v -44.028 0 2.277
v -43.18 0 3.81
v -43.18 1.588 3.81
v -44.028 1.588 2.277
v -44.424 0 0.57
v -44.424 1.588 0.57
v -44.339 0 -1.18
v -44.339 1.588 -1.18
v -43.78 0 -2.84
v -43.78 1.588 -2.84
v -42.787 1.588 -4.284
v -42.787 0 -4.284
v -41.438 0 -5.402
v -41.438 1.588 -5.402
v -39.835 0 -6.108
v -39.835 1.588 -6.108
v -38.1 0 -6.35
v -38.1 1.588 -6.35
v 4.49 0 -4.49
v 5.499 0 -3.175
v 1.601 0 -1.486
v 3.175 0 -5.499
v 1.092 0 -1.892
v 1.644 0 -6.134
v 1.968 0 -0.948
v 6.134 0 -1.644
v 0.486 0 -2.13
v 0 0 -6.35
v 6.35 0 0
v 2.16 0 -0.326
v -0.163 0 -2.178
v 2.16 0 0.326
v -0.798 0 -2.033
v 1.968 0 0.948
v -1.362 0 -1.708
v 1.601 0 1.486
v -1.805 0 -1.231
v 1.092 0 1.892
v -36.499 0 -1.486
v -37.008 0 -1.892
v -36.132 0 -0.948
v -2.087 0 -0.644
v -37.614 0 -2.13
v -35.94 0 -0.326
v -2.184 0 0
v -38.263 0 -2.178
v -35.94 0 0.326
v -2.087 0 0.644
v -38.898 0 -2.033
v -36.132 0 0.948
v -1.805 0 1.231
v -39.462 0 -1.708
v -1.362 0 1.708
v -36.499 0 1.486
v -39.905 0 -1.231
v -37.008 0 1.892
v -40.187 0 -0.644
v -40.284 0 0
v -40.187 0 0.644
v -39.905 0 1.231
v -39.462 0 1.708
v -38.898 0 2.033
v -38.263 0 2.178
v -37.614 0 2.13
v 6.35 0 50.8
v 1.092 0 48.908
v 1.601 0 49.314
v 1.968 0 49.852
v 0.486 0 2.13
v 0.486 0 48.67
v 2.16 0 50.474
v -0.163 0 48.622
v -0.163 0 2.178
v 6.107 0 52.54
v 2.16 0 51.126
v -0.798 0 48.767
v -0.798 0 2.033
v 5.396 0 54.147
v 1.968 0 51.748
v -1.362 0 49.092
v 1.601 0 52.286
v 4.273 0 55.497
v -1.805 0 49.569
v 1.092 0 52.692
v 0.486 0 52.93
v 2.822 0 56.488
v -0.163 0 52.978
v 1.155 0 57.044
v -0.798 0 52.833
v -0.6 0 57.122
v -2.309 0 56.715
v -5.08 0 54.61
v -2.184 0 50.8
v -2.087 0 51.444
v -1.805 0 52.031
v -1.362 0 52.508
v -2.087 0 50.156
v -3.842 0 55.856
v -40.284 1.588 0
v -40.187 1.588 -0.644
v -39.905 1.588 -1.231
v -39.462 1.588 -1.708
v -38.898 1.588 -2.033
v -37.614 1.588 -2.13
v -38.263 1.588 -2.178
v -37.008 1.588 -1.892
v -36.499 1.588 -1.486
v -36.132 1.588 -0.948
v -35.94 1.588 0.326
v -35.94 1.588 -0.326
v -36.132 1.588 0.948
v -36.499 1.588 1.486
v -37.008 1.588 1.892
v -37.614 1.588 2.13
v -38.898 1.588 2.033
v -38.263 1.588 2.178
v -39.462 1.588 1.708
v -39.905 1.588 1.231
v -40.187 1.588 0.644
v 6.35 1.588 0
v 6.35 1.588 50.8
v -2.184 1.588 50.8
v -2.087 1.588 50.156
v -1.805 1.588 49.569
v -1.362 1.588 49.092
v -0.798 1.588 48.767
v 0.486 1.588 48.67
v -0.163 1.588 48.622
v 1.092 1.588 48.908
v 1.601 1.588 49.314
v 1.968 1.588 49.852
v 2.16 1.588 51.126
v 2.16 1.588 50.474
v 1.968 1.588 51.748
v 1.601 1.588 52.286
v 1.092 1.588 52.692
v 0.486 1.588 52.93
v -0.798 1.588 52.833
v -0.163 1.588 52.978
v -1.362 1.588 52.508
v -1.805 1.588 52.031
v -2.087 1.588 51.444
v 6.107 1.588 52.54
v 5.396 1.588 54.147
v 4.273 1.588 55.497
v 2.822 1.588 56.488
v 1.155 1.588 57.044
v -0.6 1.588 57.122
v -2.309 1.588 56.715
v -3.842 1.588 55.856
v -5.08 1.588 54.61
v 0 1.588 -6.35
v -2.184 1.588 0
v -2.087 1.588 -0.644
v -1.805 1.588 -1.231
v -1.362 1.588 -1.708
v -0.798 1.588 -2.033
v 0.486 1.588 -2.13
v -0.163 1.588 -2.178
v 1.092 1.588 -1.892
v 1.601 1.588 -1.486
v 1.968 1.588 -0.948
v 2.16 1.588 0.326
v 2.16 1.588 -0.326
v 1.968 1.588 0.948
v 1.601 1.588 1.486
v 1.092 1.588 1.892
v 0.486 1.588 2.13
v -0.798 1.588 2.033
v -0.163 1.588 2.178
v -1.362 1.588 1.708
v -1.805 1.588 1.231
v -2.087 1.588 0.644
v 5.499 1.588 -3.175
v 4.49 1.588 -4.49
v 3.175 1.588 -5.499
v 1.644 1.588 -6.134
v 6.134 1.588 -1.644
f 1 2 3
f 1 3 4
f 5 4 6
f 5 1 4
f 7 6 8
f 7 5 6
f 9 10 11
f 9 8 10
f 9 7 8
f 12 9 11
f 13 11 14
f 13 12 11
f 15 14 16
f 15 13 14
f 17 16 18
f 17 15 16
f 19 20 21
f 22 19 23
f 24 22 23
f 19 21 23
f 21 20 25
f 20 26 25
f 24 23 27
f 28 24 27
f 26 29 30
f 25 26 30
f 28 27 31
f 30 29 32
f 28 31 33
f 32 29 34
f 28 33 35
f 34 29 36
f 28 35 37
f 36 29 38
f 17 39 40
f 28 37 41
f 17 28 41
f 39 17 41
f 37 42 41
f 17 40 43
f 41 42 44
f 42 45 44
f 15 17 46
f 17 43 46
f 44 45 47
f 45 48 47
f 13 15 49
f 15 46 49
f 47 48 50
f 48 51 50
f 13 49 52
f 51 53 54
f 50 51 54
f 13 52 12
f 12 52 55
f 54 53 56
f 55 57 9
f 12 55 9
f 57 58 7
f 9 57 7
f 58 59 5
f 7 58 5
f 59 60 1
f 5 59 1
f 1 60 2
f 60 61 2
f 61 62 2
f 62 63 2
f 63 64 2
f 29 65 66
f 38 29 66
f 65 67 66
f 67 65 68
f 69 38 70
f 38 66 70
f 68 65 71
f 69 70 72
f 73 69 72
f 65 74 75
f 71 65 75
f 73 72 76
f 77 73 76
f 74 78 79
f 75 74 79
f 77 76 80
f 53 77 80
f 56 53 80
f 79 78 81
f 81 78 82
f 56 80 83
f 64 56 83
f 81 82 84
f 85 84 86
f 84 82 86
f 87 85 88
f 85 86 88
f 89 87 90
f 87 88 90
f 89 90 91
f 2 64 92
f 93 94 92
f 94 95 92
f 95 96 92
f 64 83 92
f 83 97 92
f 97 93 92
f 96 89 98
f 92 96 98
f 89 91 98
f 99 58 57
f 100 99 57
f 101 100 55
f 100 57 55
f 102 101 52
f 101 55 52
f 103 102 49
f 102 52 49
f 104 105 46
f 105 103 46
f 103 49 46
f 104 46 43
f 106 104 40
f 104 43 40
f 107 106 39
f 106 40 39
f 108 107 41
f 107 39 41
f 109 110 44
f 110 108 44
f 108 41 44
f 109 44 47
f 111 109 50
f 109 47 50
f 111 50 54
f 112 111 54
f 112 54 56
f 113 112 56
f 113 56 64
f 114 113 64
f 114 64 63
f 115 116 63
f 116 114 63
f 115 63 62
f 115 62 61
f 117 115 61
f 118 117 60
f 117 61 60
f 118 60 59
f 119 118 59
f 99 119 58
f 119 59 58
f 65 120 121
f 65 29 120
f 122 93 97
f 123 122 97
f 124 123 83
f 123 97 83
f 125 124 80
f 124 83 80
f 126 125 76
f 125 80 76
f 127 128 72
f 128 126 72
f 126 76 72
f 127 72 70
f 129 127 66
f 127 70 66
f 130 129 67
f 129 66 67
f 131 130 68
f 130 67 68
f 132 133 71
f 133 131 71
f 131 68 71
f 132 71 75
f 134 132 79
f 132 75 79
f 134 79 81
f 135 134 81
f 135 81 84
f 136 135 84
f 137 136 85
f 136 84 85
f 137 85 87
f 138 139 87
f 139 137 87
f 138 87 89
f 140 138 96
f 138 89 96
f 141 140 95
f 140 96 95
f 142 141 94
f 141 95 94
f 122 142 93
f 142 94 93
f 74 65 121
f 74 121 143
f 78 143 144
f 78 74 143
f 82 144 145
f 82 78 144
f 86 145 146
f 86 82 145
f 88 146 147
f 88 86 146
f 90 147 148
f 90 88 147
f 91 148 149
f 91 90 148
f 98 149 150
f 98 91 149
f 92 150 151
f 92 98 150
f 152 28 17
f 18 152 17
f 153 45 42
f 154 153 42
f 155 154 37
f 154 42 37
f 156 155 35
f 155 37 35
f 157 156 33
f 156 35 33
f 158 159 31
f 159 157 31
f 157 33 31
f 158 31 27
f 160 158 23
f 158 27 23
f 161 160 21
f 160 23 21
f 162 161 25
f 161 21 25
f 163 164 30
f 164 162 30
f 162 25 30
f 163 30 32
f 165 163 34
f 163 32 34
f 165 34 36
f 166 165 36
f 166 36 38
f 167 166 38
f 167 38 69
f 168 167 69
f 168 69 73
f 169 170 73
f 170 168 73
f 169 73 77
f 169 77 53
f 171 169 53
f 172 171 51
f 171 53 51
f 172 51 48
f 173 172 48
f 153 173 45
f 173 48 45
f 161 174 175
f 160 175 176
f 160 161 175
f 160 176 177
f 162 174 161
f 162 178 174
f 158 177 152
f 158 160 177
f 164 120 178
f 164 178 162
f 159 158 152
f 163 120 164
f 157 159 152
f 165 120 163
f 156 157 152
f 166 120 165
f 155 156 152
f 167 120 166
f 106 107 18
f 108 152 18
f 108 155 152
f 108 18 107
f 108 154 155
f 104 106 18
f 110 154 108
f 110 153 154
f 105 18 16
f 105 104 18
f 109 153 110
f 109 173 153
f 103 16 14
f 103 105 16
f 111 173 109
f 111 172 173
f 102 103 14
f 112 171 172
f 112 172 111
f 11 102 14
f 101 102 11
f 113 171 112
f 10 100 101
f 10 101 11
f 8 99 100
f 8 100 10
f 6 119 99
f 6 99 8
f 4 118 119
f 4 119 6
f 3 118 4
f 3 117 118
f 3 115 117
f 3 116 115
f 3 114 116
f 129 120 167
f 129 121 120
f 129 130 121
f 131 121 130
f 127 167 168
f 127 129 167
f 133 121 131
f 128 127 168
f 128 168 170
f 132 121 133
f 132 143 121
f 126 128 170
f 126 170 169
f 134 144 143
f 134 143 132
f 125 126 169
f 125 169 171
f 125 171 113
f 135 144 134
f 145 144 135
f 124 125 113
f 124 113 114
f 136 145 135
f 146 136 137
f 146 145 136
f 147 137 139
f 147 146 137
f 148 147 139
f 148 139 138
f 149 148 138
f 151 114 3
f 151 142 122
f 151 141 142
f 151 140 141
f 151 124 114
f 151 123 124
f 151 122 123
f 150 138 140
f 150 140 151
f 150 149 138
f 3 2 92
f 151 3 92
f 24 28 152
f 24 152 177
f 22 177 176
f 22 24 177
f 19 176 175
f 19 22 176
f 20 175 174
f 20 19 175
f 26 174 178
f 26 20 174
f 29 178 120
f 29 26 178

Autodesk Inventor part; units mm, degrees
ref_plane "YZ Plane" through (0, 0, 0) normal (1, 0, 0) x (0, 1, 0)
ref_plane "XZ Plane" through (0, 0, 0) normal (0, 1, 0) x (-1, 0, 0)
ref_plane "XY Plane" through (0, 0, 0) normal (0, 0, 1) x (1, 0, 0)
sketch "main" plane through (0, 0, 0) normal (0, 0, 1) x (1, 0, 0)
  circle A0 centre (-17.594, -20.0255) radius 2.1844
  circle A1 centre (20.506, -20.0255) radius 2.1844
  circle A2 centre (-17.594, 30.7745) radius 2.1844
  arc A3 (-23.944, -20.0255) -> (-17.594, -26.3755) centre (-17.594, -20.0255) ccw
  arc A4 (20.506, -26.3755) -> (25.586, -16.2155) centre (20.506, -20.0255) ccw
  arc A5 (-12.514, 34.5845) -> (-23.944, 30.7745) centre (-17.594, 30.7745) ccw
  line L0 (-17.594, -26.3755) -> (20.506, -26.3755)
  line L1 (-23.944, -20.0255) -> (-23.944, 30.7745)
  line L2 (25.586, -16.2155) -> (-12.514, 34.5845)
  point P0 (-7.053, -5.2935)
  dimension "d0" = 12.7
  dimension "d1" = 12.7
  dimension "d2" = 12.7
sketch "Sketch1" plane through (0, 0, 0) normal (0, 1, 0) x (-1, 0, 0)
  circle A0 centre (0, 0) radius 2.1844
  circle A1 centre (38.1, 0) radius 2.1844
  circle A2 centre (0, 50.8) radius 2.1844
  arc A3 (-6.35, 0) -> (0, -6.35) centre (0, 0) ccw
  arc A4 (38.1, -6.35) -> (43.18, 3.81) centre (38.1, 0) ccw
  arc A5 (5.08, 54.61) -> (-6.35, 50.8) centre (0, 50.8) ccw
  line L0 (0, -6.35) -> (38.1, -6.35)
  line L1 (-6.35, 0) -> (-6.35, 50.8)
  line L2 (43.18, 3.81) -> (5.08, 54.61)
extrude "Extrusion1" add sketch "Sketch1" along normal blind 1.5875
equation "\"BendRadius\" = Thickness"
equation "\"BendReliefWidth\" = Thickness"
equation "\"BendReliefDepth\" = 0.5 * Thickness"
equation "\"CornerReliefSize\" = 4 * Thickness"
equation "\"MinimumRemnant\" = 2 * Thickness"
equation "\"TransitionRadius\" = BendRadius"
equation "\"JacobiRadiusSize\" = BendRadius"
equation "\"GapSize\" = Thickness"
equation "\"Thickness\" = 1.5875"
properties part number "intake_gusset" material "Acetal Resin, White"
